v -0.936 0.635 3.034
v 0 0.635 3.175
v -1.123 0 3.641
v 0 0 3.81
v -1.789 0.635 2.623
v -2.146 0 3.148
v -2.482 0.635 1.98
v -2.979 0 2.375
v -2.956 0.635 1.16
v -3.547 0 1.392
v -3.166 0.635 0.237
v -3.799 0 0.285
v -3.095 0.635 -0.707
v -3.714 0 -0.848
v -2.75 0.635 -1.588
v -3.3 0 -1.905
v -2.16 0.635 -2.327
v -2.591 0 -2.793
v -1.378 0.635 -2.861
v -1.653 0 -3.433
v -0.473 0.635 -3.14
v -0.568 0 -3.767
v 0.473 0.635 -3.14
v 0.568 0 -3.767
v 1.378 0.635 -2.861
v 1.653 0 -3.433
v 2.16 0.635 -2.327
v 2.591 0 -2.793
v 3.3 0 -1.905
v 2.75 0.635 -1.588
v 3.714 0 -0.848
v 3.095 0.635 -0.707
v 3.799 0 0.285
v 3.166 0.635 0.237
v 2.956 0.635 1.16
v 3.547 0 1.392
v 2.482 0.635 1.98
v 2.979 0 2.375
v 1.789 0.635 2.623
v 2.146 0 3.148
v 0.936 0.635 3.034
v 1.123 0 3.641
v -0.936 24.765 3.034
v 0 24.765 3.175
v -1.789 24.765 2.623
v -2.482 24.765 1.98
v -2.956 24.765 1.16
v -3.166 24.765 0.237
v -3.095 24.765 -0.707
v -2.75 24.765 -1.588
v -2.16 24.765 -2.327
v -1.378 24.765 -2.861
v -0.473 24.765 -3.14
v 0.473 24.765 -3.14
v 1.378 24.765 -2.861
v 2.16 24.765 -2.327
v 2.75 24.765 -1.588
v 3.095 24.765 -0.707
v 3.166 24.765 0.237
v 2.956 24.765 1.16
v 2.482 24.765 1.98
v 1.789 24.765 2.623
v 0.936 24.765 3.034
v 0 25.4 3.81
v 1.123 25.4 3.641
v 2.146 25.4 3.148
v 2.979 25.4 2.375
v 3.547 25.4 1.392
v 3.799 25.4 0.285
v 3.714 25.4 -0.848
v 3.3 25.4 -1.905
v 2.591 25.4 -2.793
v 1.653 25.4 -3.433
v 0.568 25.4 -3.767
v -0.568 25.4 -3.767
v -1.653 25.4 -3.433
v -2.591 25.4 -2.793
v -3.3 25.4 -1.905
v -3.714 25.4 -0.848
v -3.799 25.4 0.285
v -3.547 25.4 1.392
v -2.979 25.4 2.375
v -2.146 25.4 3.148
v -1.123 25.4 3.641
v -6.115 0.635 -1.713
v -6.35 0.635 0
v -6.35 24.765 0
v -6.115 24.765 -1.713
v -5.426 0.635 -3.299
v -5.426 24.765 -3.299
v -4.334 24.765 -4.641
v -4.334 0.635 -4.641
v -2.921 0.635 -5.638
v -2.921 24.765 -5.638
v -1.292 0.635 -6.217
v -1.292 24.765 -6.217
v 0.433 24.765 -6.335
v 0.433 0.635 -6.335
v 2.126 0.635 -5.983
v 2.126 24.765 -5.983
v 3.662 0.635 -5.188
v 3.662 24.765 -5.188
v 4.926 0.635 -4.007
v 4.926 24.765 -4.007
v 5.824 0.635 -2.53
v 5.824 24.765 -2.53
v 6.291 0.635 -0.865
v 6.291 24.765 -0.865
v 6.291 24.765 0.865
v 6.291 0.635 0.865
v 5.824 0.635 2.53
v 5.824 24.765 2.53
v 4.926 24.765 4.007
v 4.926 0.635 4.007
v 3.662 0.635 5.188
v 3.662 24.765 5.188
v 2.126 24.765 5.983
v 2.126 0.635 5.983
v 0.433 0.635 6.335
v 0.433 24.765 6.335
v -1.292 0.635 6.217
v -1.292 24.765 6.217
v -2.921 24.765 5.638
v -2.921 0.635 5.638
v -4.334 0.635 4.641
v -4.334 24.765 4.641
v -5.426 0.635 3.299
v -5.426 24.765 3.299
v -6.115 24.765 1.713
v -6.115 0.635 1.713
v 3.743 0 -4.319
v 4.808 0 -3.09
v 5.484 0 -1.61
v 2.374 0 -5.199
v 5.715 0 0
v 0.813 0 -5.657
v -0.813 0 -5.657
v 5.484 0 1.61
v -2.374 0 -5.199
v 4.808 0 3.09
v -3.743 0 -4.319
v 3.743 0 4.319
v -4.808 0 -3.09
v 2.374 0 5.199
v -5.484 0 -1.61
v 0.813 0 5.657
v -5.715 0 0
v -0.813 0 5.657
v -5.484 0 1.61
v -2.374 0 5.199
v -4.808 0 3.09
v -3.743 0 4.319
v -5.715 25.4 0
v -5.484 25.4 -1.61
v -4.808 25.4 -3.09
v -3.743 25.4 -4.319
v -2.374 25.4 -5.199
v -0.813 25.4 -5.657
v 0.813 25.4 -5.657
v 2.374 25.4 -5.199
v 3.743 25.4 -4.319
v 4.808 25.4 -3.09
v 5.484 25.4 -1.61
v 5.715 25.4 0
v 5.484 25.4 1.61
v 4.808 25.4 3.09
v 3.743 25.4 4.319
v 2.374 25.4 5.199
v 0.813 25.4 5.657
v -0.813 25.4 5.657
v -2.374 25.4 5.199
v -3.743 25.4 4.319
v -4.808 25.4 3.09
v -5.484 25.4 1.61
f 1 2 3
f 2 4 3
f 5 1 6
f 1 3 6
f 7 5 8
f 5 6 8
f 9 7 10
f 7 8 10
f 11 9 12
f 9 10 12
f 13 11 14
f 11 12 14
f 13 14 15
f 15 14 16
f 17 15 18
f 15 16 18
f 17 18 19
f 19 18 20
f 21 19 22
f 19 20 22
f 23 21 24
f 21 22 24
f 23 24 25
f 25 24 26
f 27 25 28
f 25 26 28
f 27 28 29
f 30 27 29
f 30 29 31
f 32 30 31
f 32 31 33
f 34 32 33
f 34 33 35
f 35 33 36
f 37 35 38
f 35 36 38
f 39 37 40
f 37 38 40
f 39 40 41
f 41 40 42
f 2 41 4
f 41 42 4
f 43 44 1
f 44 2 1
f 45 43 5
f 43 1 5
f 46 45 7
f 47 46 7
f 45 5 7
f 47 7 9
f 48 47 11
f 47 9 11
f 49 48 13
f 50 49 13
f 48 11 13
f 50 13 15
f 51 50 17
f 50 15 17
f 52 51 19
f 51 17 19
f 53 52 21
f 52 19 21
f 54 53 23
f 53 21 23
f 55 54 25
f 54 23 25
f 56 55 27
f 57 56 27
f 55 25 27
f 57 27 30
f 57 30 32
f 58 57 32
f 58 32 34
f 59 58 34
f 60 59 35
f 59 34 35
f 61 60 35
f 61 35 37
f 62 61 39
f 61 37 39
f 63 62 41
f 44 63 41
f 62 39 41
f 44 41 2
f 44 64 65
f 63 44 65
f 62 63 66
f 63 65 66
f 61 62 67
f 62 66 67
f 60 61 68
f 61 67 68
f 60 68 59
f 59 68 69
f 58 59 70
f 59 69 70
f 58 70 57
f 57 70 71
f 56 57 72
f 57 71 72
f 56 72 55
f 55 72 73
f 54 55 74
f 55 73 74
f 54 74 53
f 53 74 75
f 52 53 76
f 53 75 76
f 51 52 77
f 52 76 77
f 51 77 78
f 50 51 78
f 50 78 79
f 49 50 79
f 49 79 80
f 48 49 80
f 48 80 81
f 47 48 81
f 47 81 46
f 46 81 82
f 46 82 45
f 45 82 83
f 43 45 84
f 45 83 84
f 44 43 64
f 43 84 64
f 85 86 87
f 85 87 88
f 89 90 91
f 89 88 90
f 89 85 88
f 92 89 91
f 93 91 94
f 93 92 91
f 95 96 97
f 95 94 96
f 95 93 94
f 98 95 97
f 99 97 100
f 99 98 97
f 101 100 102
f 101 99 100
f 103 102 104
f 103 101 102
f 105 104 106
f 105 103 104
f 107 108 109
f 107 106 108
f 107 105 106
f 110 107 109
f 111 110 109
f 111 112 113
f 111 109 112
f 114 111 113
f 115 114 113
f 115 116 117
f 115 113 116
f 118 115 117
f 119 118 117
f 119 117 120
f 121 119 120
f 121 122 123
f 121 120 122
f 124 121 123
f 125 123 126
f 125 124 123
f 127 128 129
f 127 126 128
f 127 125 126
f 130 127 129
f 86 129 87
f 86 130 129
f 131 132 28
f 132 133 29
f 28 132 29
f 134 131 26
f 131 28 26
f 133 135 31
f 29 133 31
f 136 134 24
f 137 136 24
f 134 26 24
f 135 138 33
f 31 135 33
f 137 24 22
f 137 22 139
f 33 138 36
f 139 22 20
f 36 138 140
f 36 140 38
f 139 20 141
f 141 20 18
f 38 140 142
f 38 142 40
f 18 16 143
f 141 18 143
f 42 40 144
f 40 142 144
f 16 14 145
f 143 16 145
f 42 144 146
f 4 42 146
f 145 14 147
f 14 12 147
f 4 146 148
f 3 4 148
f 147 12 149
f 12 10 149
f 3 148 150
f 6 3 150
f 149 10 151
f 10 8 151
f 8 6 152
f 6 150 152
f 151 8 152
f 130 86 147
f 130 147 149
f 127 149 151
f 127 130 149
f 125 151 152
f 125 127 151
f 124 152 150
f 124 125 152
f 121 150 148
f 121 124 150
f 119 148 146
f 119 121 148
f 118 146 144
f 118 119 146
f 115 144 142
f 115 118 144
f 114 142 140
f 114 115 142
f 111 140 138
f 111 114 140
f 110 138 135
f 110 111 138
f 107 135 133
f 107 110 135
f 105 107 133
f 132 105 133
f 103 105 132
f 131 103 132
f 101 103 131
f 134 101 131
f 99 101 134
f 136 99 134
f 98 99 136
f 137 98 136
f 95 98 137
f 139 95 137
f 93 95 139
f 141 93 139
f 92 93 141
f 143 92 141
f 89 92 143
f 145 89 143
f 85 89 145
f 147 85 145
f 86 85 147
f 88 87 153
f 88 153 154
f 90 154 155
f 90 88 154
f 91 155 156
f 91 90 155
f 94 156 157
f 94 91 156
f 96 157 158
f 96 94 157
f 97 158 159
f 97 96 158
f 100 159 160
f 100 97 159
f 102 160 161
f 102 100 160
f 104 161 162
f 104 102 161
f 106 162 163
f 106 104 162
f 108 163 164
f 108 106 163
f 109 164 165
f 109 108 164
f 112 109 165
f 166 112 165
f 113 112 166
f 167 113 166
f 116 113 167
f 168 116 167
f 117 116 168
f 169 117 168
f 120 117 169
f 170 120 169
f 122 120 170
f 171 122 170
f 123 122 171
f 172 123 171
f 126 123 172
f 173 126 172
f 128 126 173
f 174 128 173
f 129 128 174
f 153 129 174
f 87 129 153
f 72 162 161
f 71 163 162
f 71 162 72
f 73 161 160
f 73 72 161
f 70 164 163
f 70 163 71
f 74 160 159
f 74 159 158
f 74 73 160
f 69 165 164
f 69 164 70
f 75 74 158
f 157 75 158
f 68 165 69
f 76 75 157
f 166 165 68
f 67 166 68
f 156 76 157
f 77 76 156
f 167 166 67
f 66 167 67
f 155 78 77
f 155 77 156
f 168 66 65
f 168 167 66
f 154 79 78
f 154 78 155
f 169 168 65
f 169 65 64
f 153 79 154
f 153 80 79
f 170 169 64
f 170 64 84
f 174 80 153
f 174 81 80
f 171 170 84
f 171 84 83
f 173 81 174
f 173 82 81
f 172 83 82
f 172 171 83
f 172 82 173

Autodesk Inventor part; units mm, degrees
ref_plane "YZ Plane" through (0, 0, 0) normal (1, 0, 0) x (0, 1, 0)
ref_plane "XZ Plane" through (0, 0, 0) normal (0, 1, 0) x (-1, 0, 0)
ref_plane "XY Plane" through (0, 0, 0) normal (0, 0, 1) x (1, 0, 0)
sketch "Sketch1" plane through (0, 0, 0) normal (0, 1, 0) x (-1, 0, 0)
  circle A0 centre (0, 0) radius 6.35
  dimension "d0" = 12.7
extrude "Extrusion1" add sketch "Sketch1" along normal blind 25.4
sketch "Sketch2" plane through (0, 25.4, 0) normal (0, 1, 0) x (1, 0, 0)
  point P0 (0, 0)
  point P1 (0, 0)
hole "Hole1" at (0, 25.4, 0) direction (0, -1, 0) diameter 6.35 end through all
chamfer "Chamfer1" distance 0.635 angle 45 2 edges at (6.35, 25.4, 0) (6.35, 0, 0)
chamfer "Chamfer2" distance 0.635 angle 45 2 edges at (0, 25.4, -3.175) (0, 0, -3.175)
properties part number "Practice_001_1inchspacer" material "Aluminum 6061"
